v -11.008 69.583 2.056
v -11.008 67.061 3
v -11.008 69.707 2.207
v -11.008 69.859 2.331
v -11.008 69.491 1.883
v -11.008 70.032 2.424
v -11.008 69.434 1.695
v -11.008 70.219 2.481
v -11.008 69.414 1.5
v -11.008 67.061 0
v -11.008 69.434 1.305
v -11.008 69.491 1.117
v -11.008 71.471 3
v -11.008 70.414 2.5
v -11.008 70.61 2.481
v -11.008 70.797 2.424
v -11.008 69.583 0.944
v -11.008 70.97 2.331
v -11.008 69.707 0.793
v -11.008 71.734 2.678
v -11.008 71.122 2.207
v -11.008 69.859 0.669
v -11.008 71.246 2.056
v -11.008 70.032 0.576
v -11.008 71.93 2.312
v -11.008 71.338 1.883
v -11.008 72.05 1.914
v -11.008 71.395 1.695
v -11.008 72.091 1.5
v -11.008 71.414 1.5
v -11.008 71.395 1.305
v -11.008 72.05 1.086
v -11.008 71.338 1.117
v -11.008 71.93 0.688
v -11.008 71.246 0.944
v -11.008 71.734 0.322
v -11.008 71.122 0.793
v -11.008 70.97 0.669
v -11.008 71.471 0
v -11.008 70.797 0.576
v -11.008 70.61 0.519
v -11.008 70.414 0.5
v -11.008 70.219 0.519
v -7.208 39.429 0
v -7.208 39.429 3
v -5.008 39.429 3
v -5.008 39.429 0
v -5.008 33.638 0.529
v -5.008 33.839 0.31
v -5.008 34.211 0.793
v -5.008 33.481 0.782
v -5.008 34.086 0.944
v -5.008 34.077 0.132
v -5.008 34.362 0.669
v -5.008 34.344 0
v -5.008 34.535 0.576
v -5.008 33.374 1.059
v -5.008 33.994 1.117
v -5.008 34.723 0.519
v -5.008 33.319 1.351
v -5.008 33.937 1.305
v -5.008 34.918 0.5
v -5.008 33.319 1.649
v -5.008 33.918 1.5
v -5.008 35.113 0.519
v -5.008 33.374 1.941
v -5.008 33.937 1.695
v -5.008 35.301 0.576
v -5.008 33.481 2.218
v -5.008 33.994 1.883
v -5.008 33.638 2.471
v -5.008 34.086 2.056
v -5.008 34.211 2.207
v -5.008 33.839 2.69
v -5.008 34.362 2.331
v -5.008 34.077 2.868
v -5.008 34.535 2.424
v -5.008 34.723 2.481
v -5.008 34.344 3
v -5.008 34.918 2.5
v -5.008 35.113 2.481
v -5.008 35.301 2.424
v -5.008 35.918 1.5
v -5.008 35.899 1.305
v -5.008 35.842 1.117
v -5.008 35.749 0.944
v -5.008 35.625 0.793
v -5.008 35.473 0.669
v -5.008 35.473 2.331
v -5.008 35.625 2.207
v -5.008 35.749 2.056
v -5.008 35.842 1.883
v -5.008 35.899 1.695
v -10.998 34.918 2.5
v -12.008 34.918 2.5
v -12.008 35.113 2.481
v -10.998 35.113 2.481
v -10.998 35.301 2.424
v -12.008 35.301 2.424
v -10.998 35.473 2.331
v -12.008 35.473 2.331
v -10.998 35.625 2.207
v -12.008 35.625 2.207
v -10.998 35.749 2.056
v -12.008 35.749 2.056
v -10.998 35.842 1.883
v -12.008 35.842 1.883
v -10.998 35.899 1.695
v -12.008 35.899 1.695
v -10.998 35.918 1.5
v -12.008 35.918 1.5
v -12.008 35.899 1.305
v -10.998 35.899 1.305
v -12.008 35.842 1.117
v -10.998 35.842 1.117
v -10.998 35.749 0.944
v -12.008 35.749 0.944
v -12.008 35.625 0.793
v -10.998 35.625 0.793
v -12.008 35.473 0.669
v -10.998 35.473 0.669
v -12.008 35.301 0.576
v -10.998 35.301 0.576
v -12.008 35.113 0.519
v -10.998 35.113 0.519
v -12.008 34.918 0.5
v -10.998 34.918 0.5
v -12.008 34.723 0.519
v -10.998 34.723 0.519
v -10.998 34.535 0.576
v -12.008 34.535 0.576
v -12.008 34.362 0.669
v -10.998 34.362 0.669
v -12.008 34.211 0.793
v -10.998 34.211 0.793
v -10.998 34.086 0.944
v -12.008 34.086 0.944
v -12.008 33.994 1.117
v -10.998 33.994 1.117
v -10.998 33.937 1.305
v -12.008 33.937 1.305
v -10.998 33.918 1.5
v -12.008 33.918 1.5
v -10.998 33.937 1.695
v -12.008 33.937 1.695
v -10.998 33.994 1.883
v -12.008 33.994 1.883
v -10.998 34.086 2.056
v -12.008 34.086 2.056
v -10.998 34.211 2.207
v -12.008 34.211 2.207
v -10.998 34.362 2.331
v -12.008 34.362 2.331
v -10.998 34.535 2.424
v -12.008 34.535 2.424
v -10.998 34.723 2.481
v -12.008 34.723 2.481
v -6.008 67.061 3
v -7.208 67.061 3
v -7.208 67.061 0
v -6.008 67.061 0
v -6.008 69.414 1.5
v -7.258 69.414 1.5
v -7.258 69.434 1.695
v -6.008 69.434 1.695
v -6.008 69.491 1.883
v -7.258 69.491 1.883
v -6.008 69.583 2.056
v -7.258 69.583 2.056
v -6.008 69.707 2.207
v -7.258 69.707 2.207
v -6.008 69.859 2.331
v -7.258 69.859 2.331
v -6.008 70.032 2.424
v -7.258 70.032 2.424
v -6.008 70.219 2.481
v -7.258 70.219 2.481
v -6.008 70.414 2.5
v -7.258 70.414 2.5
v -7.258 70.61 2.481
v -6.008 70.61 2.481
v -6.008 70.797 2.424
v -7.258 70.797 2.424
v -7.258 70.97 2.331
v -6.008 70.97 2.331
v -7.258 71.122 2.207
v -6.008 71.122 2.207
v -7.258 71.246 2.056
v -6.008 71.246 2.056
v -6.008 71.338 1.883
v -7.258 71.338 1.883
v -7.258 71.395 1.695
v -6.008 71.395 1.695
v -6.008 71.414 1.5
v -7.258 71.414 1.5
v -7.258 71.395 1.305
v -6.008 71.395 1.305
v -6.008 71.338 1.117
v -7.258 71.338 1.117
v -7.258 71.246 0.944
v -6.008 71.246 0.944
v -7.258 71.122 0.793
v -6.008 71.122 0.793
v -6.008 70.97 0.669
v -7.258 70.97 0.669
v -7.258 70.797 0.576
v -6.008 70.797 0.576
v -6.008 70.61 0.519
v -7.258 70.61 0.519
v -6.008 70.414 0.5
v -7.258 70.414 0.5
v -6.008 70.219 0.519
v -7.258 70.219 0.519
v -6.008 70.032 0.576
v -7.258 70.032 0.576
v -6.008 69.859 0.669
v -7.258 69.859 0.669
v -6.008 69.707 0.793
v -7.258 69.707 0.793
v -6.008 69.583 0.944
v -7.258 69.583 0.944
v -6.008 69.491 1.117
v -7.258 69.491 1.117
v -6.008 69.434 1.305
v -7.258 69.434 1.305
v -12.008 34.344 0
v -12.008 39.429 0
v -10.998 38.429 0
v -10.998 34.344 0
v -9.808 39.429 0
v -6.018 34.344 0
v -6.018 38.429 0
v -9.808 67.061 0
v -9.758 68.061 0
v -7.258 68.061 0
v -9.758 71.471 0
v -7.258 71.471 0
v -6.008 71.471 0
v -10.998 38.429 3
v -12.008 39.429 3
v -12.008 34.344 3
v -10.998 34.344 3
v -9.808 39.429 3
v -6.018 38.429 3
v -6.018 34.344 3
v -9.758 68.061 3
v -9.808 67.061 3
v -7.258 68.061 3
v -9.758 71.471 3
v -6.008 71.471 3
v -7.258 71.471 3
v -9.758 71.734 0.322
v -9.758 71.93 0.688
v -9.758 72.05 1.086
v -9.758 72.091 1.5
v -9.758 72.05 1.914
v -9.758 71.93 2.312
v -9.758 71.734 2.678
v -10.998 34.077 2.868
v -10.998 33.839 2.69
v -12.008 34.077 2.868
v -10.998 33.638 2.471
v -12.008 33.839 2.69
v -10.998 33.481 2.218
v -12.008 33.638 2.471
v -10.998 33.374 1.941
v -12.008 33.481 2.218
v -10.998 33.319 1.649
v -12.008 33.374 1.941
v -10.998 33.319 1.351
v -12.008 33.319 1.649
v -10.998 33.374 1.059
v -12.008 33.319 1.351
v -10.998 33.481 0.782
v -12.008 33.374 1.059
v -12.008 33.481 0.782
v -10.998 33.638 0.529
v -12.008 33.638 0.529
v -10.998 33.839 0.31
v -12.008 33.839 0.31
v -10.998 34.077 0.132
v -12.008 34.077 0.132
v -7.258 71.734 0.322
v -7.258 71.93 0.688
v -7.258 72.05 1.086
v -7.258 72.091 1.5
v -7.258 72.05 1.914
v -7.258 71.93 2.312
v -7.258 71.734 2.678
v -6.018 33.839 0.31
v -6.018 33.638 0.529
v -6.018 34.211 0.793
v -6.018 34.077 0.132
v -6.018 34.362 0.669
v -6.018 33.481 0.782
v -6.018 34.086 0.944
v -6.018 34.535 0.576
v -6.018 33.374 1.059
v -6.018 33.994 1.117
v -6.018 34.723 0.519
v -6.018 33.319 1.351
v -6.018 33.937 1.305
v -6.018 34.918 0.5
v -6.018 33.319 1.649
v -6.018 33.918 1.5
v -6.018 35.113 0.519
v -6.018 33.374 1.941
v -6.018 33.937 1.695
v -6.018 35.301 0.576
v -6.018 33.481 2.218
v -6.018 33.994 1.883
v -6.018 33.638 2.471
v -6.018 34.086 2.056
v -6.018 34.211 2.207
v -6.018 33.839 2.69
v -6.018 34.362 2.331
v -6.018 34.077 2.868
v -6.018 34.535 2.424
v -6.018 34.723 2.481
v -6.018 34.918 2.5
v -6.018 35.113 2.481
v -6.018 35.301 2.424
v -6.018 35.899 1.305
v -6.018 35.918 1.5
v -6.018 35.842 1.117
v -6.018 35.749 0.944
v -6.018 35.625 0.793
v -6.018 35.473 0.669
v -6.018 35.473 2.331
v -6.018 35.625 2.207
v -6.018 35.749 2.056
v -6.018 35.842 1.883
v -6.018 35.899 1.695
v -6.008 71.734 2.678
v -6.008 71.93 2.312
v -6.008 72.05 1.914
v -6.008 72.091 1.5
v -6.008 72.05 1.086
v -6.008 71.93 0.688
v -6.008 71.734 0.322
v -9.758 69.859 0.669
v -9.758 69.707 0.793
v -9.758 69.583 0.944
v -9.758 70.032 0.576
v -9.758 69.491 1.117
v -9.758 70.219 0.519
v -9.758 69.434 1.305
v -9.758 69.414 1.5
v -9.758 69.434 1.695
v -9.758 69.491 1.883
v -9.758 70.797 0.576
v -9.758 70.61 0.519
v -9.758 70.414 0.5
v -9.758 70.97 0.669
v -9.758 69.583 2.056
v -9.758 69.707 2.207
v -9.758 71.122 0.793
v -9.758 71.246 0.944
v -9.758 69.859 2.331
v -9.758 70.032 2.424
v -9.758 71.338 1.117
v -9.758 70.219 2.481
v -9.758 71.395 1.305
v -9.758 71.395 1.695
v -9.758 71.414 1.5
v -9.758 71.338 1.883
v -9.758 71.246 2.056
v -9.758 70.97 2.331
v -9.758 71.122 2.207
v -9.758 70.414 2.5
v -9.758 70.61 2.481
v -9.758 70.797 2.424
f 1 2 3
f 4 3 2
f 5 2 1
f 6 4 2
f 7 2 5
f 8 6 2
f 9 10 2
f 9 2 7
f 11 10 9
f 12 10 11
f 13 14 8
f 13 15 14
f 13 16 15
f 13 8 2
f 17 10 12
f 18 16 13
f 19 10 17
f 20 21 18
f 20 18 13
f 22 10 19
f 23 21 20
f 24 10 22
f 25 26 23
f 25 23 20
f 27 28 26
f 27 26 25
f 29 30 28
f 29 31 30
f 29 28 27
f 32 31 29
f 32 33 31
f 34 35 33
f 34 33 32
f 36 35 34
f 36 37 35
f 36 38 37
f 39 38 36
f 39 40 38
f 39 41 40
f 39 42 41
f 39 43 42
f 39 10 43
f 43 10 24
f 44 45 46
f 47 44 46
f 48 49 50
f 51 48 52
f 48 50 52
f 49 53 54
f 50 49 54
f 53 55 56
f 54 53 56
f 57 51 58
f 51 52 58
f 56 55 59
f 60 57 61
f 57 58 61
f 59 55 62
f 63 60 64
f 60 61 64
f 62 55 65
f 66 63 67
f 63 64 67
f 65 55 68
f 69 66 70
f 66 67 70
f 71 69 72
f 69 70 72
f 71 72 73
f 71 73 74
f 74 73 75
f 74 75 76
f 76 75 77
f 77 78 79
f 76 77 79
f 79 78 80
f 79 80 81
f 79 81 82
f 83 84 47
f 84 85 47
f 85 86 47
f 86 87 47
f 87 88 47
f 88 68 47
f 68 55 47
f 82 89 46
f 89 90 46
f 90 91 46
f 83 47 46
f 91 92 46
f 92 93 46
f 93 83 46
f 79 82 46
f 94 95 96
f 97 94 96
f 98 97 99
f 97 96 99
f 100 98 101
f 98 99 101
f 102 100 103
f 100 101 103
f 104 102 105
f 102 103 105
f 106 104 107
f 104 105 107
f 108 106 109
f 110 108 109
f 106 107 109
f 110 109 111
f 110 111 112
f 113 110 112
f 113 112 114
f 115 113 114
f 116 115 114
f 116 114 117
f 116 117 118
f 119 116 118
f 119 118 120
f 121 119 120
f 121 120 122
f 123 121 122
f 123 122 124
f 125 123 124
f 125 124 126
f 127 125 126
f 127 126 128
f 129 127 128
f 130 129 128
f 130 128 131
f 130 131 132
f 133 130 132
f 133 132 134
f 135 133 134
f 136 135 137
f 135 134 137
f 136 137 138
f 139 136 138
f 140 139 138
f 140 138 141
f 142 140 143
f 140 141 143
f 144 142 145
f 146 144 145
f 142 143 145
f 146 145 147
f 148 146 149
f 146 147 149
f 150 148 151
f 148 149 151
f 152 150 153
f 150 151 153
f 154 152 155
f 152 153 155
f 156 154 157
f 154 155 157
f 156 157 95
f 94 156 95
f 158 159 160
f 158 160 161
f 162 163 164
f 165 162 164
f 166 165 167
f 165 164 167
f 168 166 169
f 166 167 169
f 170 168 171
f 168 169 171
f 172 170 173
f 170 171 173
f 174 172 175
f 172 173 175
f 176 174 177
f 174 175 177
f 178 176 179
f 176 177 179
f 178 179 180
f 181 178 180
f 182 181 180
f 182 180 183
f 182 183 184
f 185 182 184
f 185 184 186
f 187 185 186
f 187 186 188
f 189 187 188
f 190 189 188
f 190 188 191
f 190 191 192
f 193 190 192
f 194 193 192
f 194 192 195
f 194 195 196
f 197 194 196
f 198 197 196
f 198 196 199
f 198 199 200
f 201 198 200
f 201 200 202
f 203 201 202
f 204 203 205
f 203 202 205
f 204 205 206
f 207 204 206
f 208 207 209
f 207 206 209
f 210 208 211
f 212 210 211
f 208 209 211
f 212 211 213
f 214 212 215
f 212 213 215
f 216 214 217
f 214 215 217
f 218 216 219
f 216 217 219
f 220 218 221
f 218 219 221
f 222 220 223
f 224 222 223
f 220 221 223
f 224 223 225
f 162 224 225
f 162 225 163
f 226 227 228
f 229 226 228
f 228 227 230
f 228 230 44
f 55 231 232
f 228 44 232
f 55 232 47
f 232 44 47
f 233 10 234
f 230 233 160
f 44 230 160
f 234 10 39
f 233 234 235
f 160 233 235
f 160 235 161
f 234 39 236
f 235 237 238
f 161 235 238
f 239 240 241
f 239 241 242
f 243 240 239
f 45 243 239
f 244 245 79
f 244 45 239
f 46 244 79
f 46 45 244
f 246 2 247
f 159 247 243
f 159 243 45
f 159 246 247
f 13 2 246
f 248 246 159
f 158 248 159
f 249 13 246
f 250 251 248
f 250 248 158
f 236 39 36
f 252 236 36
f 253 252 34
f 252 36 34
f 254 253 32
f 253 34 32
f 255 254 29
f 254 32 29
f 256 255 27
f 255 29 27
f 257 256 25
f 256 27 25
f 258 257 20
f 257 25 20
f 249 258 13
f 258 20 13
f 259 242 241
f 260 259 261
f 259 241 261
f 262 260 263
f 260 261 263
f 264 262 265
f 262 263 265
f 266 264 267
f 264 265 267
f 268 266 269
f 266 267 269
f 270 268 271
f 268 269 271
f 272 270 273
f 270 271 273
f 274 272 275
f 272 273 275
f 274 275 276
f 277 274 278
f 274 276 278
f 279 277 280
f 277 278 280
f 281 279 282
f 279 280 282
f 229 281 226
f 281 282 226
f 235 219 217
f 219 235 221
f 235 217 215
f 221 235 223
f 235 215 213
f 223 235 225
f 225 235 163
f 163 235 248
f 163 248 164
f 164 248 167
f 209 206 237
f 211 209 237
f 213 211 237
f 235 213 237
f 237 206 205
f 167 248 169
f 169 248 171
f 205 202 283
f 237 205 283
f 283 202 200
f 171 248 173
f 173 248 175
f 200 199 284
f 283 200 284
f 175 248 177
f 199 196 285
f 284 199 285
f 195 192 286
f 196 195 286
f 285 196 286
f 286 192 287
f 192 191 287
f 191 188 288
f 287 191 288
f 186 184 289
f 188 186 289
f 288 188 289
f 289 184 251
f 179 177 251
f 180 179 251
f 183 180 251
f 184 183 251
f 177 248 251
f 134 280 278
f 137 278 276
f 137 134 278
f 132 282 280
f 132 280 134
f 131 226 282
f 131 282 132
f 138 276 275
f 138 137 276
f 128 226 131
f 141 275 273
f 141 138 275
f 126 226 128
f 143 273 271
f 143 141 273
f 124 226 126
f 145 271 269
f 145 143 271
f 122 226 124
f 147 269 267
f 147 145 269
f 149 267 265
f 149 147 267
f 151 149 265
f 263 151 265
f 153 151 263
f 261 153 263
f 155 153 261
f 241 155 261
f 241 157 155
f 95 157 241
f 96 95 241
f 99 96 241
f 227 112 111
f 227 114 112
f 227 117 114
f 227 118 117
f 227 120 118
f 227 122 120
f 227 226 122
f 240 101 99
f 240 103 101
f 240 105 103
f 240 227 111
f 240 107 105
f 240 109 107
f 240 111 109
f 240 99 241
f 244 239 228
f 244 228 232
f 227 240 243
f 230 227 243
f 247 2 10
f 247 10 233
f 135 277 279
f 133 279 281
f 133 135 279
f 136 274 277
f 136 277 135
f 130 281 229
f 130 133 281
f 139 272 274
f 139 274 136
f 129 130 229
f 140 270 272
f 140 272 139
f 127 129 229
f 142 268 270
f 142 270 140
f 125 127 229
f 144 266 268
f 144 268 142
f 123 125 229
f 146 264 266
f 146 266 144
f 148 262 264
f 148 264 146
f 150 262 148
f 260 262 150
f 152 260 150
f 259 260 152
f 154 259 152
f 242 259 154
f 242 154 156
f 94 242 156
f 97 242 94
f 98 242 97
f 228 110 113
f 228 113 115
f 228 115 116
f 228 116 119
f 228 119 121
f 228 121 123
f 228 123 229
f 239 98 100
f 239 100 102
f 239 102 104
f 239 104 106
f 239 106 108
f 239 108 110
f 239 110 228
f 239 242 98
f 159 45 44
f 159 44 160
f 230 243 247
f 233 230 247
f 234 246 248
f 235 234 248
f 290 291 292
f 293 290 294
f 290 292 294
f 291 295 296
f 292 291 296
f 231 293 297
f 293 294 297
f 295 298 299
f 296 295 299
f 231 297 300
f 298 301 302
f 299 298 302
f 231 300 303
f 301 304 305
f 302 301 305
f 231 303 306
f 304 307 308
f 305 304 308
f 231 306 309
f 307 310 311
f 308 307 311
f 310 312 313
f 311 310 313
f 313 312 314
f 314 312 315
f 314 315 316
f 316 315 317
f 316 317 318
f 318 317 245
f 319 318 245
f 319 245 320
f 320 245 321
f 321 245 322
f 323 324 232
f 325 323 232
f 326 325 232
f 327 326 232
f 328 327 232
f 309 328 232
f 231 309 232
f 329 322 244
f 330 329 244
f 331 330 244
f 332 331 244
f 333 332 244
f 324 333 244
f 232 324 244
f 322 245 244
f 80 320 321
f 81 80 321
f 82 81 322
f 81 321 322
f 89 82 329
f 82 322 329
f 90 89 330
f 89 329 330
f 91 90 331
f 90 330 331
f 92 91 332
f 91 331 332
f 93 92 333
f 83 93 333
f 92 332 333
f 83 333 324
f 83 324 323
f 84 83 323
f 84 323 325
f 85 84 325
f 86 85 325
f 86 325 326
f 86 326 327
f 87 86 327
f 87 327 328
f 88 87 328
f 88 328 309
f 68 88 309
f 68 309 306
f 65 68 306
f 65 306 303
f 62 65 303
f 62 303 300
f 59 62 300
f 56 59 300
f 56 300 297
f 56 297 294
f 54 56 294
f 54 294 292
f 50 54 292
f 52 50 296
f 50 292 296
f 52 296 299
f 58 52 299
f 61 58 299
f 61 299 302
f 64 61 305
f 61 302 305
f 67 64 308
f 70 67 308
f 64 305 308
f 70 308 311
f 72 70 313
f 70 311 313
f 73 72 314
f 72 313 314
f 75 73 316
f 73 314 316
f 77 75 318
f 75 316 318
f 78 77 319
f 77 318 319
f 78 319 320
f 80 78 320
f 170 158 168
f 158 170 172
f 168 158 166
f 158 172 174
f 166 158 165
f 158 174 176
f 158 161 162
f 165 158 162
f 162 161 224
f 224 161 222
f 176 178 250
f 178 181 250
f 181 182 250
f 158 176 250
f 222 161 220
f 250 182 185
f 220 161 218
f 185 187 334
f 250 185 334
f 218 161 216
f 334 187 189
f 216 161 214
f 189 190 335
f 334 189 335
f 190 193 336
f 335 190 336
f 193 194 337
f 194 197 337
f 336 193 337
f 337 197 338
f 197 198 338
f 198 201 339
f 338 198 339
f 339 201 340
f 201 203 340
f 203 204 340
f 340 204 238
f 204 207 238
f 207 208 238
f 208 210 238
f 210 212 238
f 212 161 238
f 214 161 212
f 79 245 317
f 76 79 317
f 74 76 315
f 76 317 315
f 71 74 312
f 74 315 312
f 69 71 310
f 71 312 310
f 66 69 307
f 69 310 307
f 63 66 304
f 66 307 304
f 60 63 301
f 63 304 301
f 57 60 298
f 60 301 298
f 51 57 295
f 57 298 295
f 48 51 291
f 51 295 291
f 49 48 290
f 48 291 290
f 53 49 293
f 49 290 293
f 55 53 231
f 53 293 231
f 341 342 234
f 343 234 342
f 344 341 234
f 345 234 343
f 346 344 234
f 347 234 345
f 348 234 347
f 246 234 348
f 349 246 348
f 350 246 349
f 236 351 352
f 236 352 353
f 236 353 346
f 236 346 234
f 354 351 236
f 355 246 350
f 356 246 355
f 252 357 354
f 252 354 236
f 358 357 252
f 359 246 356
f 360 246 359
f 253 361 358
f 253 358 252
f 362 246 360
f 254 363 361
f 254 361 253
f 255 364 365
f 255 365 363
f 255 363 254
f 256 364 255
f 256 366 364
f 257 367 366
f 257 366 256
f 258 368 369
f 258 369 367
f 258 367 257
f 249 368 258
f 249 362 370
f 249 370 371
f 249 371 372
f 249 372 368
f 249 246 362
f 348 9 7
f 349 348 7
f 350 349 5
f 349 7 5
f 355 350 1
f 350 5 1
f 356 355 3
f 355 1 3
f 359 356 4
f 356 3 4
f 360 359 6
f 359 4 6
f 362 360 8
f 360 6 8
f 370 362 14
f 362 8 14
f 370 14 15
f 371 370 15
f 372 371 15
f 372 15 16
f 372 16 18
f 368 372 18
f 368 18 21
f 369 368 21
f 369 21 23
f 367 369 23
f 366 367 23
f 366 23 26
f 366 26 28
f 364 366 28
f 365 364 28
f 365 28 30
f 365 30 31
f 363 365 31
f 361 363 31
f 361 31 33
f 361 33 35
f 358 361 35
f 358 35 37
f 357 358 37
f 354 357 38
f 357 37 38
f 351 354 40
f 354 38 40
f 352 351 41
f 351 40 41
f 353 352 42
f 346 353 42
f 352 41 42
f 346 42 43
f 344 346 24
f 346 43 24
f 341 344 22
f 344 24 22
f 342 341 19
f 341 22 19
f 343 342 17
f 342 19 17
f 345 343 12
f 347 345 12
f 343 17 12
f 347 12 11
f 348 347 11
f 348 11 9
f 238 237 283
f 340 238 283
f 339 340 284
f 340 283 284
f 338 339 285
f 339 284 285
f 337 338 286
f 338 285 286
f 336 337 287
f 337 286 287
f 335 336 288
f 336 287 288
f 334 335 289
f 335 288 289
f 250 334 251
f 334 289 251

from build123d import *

# Parameters (mm, degrees)
CROQUIS1_W              = 5
CROQUIS1_H              = 33
SALIENTE_EXTRUIR1_DEPTH = 3
CROQUIS3_W              = 7
CROQUIS3_H              = 3
SALIENTE_EXTRUIR2_DEPTH = 7
CORTAR_EXTRUIR1_REACH   = 75.478
CROQUIS4_W              = 4.98
CROQUIS4_H              = 6
CROQUIS5_R              = 1
CORTAR_EXTRUIR4_DEPTH   = 15
CORTAR_EXTRUIR5_DEPTH   = 15
CROQUIS8_W              = 2.5
CROQUIS8_H              = 4.326412588
CORTAR_EXTRUIR6_DEPTH   = 10
CORTAR_EXTRUIR7_REACH   = 75.146
CROQUIS9_W              = 1.2
CROQUIS9_H              = 27.63275501


with BuildPart() as part:
    # Croquis1 → Saliente-Extruir1 (new body)
    with BuildSketch(Plane.XY):
        with Locations((-8.507787801, 55.928529755)):
            Rectangle(CROQUIS1_W, CROQUIS1_H)
    extrude(amount=SALIENTE_EXTRUIR1_DEPTH)

    # Croquis3 → Saliente-Extruir2 (add)
    with BuildSketch(Plane.XZ.offset(-39.428529755)):
        with Locations((-8.507787801, 1.5)):
            Rectangle(CROQUIS3_W, CROQUIS3_H)
    extrude(amount=SALIENTE_EXTRUIR2_DEPTH)

    # Croquis4 → Cortar-Extruir1 (cut, up to next)
    with BuildSketch(Plane.XY.offset(3), mode=Mode.PRIVATE) as cortar_extruir1_sk1:
        with Locations((-8.507787801, 35.428529755)):
            Rectangle(CROQUIS4_W, CROQUIS4_H)
    cortar_extruir1_tool1 = extrude(cortar_extruir1_sk1.sketch, amount=-CORTAR_EXTRUIR1_REACH, mode=Mode.PRIVATE) & part.part
    add(cortar_extruir1_tool1.solids().sort_by_distance((-8.507788, 35.42853, 3))[0], mode=Mode.SUBTRACT)

    # Croquis5 → Cortar-Extruir4 (cut)
    with BuildSketch(Plane.ZY.offset(12.007787801)):
        with Locations(Location((1.5, 70.414414657, 0), (0, 0, 270))):
            Circle(CROQUIS5_R)
        with Locations((1.5, 34.917908979)):
            Circle(CROQUIS5_R)
    extrude(amount=-CORTAR_EXTRUIR4_DEPTH, mode=Mode.SUBTRACT)

    # Croquis7 → Cortar-Extruir5 (cut)
    with BuildSketch(Plane.ZY.offset(12.007787801)):
        with BuildLine():
            Line((3, 71.470870039), (3, 72.821585946))
            Line((3, 72.821585946), (0, 72.821585946))
            Line((0, 72.821585946), (0, 71.470870039))
            ThreePointArc((0, 71.470870039), (1.5, 72.091024013), (3, 71.470870039))
        make_face()
        with BuildLine():
            Line((0, 34.344024201), (0, 31.961571753))
            Line((0, 31.961571753), (3, 31.961571753))
            Line((3, 31.961571753), (3, 34.344024201))
            ThreePointArc((3, 34.344024201), (1.5, 33.311875437), (0, 34.344024201))
        make_face()
    extrude(amount=-CORTAR_EXTRUIR5_DEPTH, mode=Mode.SUBTRACT)

    # Croquis8 → Cortar-Extruir6 (cut)
    with BuildSketch(Plane.XY.offset(3)):
        with Locations((-8.507787801, 70.224491059)):
            Rectangle(CROQUIS8_W, CROQUIS8_H)
    extrude(amount=-CORTAR_EXTRUIR6_DEPTH, mode=Mode.SUBTRACT)

    # Croquis9 → Cortar-Extruir7 (cut, up to next)
    with BuildSketch(Plane.XY.offset(3), mode=Mode.PRIVATE) as cortar_extruir7_sk1:
        with Locations((-10.407787801, 53.24490726)):
            Rectangle(CROQUIS9_W, CROQUIS9_H)
    cortar_extruir7_tool1 = extrude(cortar_extruir7_sk1.sketch, amount=-CORTAR_EXTRUIR7_REACH, mode=Mode.PRIVATE) & part.part
    # Croquis9 → Cortar-Extruir7 (cut, up to next)
    with BuildSketch(Plane.XY.offset(3), mode=Mode.PRIVATE) as cortar_extruir7_sk2:
        with Locations((-6.607787801, 53.24490726)):
            Rectangle(CROQUIS9_W, CROQUIS9_H)
    cortar_extruir7_tool2 = extrude(cortar_extruir7_sk2.sketch, amount=-CORTAR_EXTRUIR7_REACH, mode=Mode.PRIVATE) & part.part
    add(cortar_extruir7_tool1.solids().sort_by_distance((-10.407788, 53.244907, 3))[0], mode=Mode.SUBTRACT)
    add(cortar_extruir7_tool2.solids().sort_by_distance((-6.607788, 53.244907, 3))[0], mode=Mode.SUBTRACT)


solid = part.part
